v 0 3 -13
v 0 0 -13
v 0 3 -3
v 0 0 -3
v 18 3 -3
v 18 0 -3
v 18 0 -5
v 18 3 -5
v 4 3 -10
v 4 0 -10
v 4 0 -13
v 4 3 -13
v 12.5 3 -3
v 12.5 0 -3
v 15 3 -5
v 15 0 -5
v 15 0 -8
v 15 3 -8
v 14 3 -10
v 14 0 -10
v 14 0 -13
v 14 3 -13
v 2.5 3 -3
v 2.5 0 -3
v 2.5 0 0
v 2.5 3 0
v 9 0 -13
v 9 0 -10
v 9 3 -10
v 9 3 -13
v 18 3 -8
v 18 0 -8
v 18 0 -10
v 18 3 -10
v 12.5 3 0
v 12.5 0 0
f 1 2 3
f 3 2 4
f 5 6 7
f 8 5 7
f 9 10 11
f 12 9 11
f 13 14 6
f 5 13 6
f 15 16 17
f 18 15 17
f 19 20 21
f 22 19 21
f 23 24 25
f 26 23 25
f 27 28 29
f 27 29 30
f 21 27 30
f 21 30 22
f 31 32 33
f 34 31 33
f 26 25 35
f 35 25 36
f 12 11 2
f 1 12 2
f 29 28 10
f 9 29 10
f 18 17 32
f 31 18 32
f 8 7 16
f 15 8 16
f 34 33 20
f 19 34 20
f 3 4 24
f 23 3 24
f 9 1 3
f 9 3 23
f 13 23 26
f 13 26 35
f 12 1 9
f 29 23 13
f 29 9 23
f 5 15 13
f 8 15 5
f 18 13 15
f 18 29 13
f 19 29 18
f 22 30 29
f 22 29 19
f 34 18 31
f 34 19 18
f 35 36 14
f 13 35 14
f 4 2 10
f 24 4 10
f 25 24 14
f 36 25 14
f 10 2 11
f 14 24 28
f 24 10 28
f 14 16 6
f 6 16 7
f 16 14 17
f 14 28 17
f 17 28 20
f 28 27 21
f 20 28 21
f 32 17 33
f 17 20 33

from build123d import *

# Parameters (mm, degrees)
CROQUIS1_W              = 5
CROQUIS1_H              = 3
SALIENTE_EXTRUIR1_DEPTH = 3


with BuildPart() as part:
    # Croquis1 → Saliente-Extruir1 (new body)
    with BuildSketch(Plane(origin=(0, 0, 0), x_dir=(1, 0, 0), z_dir=(0, 1, 0))):
        Polygon((4, 10), (4, 13), (0, 13), (0, 3), (2.5, 3), (2.5, 0), (12.5, 0), (12.5, 3), (18, 3), (18, 5), (15, 5), (15, 6.5), (15, 8), (18, 8), (18, 10), (14, 10), (9, 10), align=None)
        with Locations((11.5, 11.5)):
            Rectangle(CROQUIS1_W, CROQUIS1_H)
    extrude(amount=SALIENTE_EXTRUIR1_DEPTH)


solid = part.part
